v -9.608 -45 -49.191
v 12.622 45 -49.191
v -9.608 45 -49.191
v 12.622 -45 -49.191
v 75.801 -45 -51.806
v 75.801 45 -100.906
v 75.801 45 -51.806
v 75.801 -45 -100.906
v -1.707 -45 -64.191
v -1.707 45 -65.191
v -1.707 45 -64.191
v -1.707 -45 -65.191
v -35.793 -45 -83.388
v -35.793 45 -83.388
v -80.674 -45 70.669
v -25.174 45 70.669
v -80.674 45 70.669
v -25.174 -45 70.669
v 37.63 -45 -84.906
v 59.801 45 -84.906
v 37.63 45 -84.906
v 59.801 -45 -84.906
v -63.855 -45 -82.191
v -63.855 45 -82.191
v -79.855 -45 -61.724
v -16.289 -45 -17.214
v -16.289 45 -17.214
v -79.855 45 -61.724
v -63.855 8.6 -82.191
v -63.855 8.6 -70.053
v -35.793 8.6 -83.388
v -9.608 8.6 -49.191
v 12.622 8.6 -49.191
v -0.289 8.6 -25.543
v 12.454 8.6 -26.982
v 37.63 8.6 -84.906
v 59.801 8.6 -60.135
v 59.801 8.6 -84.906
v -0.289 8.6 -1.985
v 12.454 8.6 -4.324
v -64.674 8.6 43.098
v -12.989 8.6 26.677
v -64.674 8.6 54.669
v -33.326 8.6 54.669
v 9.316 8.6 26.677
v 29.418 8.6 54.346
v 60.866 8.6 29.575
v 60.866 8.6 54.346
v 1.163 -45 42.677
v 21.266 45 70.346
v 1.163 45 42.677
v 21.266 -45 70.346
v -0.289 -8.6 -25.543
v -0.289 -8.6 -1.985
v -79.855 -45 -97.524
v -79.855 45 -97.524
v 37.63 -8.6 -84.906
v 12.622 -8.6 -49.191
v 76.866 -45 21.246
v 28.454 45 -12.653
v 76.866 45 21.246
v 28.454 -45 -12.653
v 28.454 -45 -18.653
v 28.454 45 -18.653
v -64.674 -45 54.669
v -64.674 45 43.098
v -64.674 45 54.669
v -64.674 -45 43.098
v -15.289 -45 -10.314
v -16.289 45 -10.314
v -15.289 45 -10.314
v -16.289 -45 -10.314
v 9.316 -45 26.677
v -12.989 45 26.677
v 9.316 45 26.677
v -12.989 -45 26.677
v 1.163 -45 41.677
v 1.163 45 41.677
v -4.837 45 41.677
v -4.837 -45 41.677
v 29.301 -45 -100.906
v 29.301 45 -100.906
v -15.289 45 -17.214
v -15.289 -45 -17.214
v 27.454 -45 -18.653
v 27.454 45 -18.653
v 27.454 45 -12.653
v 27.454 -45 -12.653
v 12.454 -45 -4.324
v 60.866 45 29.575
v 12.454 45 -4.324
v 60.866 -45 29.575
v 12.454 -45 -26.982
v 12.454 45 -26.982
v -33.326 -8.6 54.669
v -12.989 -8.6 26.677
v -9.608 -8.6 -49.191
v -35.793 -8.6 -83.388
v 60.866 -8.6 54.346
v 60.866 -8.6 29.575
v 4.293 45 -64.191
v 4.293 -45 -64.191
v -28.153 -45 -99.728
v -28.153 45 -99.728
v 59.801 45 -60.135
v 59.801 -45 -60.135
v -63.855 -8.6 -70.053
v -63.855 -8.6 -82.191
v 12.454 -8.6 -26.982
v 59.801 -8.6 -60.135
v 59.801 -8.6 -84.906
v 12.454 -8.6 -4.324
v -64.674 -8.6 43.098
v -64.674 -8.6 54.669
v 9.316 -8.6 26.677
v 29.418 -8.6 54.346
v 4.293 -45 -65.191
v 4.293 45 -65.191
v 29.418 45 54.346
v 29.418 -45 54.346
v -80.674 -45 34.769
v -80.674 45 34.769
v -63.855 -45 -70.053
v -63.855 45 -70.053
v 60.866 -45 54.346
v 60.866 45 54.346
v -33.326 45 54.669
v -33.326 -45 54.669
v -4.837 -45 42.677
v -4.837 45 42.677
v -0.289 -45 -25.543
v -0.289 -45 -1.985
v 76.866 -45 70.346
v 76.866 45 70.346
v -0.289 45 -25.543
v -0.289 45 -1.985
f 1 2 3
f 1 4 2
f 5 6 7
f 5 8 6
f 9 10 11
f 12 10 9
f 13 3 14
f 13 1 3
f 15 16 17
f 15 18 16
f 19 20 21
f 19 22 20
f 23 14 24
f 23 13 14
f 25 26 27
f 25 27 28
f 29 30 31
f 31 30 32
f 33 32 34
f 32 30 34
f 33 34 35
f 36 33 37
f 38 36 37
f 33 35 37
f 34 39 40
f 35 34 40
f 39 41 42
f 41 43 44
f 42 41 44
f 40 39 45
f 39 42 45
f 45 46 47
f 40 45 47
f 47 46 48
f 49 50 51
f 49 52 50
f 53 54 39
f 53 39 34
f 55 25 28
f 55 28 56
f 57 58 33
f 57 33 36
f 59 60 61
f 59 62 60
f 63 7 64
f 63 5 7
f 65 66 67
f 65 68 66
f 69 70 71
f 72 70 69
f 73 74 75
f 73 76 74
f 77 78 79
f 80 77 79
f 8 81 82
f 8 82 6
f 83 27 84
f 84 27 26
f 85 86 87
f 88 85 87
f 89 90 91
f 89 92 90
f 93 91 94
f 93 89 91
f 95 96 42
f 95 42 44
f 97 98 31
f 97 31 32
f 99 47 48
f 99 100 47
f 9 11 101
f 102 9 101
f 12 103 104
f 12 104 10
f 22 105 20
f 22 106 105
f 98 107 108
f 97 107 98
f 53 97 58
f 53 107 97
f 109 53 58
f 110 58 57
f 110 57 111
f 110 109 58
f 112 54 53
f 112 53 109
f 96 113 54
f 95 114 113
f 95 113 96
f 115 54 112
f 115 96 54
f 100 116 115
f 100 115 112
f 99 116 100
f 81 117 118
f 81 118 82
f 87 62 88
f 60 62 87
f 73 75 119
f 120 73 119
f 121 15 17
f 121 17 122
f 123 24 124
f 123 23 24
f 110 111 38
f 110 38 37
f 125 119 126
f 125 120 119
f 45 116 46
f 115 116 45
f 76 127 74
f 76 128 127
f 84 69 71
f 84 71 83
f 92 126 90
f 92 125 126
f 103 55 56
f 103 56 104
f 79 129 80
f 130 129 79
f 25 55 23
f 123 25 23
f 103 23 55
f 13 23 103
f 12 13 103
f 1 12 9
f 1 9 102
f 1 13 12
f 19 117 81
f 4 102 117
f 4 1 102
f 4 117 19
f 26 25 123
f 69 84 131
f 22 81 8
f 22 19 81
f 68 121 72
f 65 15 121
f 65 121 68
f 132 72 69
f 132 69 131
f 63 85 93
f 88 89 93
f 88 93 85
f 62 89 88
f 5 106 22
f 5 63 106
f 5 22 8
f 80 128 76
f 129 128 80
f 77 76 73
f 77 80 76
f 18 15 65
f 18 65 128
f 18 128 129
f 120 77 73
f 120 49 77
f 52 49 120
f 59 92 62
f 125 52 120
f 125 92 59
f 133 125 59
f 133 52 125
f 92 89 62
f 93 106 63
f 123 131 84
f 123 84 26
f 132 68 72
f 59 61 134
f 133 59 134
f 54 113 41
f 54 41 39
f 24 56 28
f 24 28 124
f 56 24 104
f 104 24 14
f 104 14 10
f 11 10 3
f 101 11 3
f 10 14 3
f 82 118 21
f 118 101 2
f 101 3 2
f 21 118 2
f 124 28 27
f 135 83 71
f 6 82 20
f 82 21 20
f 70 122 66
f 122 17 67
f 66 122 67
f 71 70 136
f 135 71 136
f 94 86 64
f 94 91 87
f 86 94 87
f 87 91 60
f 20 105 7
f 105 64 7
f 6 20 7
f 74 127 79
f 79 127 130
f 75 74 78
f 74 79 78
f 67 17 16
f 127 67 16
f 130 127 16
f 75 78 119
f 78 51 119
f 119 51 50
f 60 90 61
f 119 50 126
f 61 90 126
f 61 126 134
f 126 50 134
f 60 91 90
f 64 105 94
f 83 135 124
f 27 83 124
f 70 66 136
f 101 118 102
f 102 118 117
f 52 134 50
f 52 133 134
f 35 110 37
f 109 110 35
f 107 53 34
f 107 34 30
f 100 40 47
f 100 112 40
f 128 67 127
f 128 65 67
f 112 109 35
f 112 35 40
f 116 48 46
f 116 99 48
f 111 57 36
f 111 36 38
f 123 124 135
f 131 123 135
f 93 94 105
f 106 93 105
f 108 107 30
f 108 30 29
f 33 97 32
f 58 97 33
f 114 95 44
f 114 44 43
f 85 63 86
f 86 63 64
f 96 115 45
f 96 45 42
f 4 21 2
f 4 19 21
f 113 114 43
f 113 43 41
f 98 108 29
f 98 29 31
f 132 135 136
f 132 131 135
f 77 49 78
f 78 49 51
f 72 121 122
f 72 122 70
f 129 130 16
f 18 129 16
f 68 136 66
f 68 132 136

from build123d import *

# Parameters (mm, degrees)
F1_DEPTH = 45
F2_DEPTH = 8.6
F3_DEPTH = 1
F4_DEPTH = 1
F5_DEPTH = 1
F6_DEPTH = 1


with BuildPart() as f1:
    # F0 (on Front) → F1 (new body, symmetric)
    with BuildSketch(Plane.XZ):
        Polygon((-25.1739548425, 70.6691186362), (-80.6739548425, 70.6691186362), (-80.6739548425, 34.7691186362), (-16.2886041614, -10.313989261), (-16.2886041614, -17.213989261), (-79.8548027982, -61.7235207218), (-79.8548027982, -97.5235207218), (-28.1532354406, -99.7282786083), (-1.7071597672, -65.19054444), (4.2928402328, -65.19054444), (29.3007728577, -100.905573571), (75.8007728577, -100.905573571), (75.8007728577, -51.805573571), (28.4537846978, -18.6528555499), (28.4537846978, -12.6528555499), (76.8656705152, 21.2455118385), (76.8656705152, 70.3455118385), (21.2656705152, 70.3455118385), (1.1634148868, 42.6771306308), (-4.8365851132, 42.6771306308), align=None)
        Polygon((9.3158221158, 26.6771305582), (29.4180777442, 54.3455117658), (60.8656704426, 54.3455117658), (60.8656704426, 29.5745846851), (12.4537846251, -4.3237827032), (12.4537846251, -26.9819283965), (59.800772785, -60.1346464176), (59.800772785, -84.9055734983), (37.6298457043, -84.9055734983), (12.6219130794, -49.1905443673), (-9.6075851147, -49.1905443673), (-35.7930620707, -83.3879448947), (-63.8548027255, -82.1912820626), (-63.8548027255, -70.0525935685), (-0.2886040887, -25.5430621076), (-0.2886040887, -1.9849164143), (-64.6739547698, 43.0981914829), (-64.6739547698, 54.6691185636), (-33.3263620714, 54.6691185636), (-12.9889923421, 26.6771305582), align=None, mode=Mode.SUBTRACT)
    extrude(amount=F1_DEPTH, both=True)

    # F3 (cut): a face of the model
    f3_faces = [f1.faces().sort_by_distance(p)[0] for p in [
        (-1.8365851132, 0, 42.6771306308),
    ]]
    extrude(f3_faces, amount=-F3_DEPTH, mode=Mode.SUBTRACT)

    # F4 (cut): a face of the model
    f4_faces = [f1.faces().sort_by_distance(p)[0] for p in [
        (-16.2886041614, 0, -13.763989261),
    ]]
    extrude(f4_faces, amount=-F4_DEPTH, mode=Mode.SUBTRACT)

    # F5 (cut): a face of the model
    f5_faces = [f1.faces().sort_by_distance(p)[0] for p in [
        (28.4537846978, 0, -15.6528555499),
    ]]
    extrude(f5_faces, amount=-F5_DEPTH, mode=Mode.SUBTRACT)

    # F6 (cut): a face of the model
    f6_faces = [f1.faces().sort_by_distance(p)[0] for p in [
        (1.2928402328, 0, -65.19054444),
    ]]
    extrude(f6_faces, amount=-F6_DEPTH, mode=Mode.SUBTRACT)


with BuildPart() as f2:
    # F0 (on Front) → F2 (new body, symmetric)
    with BuildSketch(Plane.XZ):
        Polygon((60.8656704426, 54.3455117658), (29.4180777442, 54.3455117658), (9.3158221158, 26.6771305582), (-12.9889923421, 26.6771305582), (-33.3263620714, 54.6691185636), (-64.6739547698, 54.6691185636), (-64.6739547698, 43.0981914829), (-0.2886040887, -1.9849164143), (-0.2886040887, -25.5430621076), (-63.8548027255, -70.0525935685), (-63.8548027255, -82.1912820626), (-35.7930620707, -83.3879448947), (-9.6075851147, -49.1905443673), (12.6219130794, -49.1905443673), (37.6298457043, -84.9055734983), (59.800772785, -84.9055734983), (59.800772785, -60.1346464176), (12.4537846251, -26.9819283965), (12.4537846251, -4.3237827032), (60.8656704426, 29.5745846851), align=None)
    extrude(amount=F2_DEPTH, both=True)


solid = Compound([f1.part, f2.part])
